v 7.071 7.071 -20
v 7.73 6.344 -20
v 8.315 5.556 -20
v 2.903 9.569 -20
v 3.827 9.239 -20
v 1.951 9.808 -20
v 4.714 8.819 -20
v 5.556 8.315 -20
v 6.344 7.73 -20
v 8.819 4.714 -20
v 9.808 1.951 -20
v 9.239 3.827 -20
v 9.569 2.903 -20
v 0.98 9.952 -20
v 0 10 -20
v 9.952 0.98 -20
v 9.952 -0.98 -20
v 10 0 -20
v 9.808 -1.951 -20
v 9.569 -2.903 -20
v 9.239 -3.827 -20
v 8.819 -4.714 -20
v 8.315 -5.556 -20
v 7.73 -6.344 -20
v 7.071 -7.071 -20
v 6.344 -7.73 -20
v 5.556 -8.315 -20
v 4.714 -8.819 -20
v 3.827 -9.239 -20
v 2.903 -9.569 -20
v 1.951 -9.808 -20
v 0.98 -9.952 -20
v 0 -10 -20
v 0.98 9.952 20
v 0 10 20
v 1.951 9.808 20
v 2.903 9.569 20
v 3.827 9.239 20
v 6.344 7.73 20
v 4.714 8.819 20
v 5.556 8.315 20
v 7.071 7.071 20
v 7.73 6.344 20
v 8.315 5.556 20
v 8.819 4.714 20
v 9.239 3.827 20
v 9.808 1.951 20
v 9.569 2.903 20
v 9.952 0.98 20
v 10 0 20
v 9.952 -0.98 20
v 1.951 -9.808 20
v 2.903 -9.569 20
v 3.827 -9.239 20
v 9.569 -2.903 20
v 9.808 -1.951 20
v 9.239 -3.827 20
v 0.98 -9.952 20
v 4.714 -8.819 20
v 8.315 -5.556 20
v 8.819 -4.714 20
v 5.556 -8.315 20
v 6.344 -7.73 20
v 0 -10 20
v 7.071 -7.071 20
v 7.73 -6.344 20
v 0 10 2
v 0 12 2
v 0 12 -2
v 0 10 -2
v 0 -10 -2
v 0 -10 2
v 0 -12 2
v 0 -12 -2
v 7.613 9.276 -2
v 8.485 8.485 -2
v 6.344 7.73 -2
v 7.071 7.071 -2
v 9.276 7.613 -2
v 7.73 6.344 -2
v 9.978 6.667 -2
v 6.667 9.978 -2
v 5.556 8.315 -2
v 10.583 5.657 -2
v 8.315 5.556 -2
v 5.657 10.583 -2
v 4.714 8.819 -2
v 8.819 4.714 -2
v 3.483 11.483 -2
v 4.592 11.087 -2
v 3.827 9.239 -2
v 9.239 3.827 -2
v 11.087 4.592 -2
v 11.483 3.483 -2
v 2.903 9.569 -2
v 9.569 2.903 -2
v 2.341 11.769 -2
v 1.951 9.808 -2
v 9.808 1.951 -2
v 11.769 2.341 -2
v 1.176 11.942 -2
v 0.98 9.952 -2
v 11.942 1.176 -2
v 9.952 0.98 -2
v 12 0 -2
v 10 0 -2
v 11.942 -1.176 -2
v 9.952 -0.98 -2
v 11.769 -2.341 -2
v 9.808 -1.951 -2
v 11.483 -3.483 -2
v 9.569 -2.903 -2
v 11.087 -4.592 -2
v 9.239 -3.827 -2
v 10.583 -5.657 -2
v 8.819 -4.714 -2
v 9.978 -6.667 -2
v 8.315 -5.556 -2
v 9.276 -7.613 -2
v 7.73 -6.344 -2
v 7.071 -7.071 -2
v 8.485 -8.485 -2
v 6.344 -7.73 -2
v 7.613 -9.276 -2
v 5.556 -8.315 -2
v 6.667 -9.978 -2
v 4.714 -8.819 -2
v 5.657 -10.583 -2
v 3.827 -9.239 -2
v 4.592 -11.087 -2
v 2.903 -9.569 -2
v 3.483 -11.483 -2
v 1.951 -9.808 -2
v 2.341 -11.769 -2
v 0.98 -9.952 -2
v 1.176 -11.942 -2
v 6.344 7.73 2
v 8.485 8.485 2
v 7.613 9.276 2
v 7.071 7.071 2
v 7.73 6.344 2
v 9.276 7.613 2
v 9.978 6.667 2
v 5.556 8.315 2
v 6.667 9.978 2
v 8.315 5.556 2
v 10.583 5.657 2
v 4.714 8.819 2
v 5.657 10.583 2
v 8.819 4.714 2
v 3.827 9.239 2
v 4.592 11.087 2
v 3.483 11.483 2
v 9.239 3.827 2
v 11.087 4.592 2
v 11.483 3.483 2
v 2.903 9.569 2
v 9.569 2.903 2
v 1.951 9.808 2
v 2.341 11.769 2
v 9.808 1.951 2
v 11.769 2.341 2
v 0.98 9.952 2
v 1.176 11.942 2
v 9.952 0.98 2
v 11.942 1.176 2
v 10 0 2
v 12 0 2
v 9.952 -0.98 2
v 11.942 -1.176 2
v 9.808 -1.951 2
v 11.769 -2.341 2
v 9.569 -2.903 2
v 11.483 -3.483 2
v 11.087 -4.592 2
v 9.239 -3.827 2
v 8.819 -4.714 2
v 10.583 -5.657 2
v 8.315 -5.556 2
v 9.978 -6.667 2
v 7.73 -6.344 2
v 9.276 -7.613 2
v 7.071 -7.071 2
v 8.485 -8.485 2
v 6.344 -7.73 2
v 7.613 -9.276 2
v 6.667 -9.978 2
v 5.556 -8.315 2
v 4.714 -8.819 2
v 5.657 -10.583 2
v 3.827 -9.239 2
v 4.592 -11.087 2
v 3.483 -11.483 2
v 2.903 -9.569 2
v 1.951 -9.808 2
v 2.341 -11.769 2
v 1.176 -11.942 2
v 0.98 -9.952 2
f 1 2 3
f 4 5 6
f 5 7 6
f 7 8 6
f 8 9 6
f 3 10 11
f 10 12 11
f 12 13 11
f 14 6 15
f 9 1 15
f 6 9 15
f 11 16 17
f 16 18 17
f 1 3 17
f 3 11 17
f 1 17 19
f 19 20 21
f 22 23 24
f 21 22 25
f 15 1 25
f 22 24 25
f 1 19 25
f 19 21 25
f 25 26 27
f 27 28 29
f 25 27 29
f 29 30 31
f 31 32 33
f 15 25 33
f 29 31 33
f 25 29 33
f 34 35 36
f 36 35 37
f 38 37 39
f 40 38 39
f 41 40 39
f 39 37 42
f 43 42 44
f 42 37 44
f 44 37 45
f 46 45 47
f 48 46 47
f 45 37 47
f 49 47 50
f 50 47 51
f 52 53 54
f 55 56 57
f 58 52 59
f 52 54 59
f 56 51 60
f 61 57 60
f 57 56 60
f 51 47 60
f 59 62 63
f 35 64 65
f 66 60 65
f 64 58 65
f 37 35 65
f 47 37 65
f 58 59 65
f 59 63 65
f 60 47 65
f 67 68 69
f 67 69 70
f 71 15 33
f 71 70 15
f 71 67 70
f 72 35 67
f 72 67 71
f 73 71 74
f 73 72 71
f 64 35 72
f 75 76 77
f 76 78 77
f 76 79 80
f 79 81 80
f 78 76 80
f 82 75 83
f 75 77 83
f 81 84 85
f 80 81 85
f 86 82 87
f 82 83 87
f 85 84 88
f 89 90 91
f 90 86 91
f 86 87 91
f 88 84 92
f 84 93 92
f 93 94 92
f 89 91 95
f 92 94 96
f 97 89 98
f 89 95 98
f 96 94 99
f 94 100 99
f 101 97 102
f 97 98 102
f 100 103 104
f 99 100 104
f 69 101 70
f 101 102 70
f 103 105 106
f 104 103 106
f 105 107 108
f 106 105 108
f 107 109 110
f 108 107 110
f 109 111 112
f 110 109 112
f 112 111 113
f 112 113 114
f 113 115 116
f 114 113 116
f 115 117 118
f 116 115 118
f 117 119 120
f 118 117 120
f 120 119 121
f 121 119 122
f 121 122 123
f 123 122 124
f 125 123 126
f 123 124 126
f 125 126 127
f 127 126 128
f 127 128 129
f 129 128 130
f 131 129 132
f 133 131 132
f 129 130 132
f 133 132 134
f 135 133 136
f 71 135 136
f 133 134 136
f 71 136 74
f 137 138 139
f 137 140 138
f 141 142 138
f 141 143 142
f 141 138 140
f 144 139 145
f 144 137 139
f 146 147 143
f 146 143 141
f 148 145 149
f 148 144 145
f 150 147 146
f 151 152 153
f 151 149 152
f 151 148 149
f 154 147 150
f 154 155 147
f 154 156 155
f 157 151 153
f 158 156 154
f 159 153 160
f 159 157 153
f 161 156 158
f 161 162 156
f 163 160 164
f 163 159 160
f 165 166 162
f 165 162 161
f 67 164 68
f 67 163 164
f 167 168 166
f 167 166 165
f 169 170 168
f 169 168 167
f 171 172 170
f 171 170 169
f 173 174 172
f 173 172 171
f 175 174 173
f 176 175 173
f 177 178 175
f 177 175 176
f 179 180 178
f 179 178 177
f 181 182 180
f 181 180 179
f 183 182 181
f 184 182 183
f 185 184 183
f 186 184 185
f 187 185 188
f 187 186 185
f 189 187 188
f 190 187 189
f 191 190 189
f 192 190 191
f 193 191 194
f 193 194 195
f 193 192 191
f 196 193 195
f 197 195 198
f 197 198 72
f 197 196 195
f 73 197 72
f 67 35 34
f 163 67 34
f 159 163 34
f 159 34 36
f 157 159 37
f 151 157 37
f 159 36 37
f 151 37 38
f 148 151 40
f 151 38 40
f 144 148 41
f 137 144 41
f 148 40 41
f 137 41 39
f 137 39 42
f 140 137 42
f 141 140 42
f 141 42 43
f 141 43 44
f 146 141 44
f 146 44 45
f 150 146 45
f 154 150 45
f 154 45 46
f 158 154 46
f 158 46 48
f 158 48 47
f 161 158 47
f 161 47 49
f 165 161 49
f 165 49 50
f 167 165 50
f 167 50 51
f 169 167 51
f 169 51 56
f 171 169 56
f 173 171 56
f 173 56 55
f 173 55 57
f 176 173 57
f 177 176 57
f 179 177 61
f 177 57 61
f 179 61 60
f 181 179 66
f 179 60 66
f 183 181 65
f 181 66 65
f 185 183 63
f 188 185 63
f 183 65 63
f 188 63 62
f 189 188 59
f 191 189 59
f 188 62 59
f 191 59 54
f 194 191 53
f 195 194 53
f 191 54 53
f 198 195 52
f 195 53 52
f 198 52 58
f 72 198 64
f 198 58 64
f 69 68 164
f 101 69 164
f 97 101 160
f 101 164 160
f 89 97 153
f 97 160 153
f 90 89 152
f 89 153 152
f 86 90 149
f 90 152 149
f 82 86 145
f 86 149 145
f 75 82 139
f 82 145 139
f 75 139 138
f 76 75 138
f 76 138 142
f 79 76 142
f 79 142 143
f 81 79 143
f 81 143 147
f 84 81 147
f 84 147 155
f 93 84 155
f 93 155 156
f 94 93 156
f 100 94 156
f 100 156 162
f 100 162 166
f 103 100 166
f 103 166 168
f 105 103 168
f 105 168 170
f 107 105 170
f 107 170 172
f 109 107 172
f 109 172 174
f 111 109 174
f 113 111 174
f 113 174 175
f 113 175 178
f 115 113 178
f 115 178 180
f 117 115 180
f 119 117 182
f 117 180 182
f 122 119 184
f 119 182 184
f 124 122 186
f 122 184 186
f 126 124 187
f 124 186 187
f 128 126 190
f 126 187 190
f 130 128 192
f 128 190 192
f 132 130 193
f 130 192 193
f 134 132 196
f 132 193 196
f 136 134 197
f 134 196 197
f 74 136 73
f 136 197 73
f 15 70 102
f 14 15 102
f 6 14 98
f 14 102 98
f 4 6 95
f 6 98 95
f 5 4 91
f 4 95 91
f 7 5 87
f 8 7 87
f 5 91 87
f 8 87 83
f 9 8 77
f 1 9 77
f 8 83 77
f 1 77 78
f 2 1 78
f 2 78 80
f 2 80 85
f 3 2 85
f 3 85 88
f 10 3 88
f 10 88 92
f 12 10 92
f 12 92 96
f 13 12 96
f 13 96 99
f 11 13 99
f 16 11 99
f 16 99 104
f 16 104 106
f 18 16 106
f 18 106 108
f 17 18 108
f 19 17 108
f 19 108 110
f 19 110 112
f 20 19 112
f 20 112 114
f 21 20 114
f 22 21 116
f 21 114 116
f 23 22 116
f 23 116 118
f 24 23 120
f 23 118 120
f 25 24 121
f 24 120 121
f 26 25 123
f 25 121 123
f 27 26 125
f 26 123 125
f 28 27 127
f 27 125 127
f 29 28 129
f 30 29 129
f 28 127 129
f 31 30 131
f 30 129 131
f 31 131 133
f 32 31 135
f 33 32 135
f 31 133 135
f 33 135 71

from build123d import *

# Parameters (mm, degrees)
F0_W     = 2
F0_H     = 2
F1_ANGLE = 180


with BuildPart() as f1:
    # F0 (on Front) → F1 (revolve, symmetric)
    with BuildSketch(Plane.XZ) as f1_sk:
        Polygon((0, 20), (0, 0), (0, -20), (10, -20), (10, -2), (10, 0), (10, 2), (10, 20), align=None)
        with Locations((11, -1)):
            Rectangle(F0_W, F0_H)
        with Locations((11, 1)):
            Rectangle(F0_W, F0_H)
    revolve(axis=Axis((0, 0, 10), (0, 0, 1)), revolution_arc=F1_ANGLE / 2)
    revolve(f1_sk.sketch, axis=Axis((0, 0, 10), (0, 0, -1)), revolution_arc=F1_ANGLE / 2)


solid = f1.part
